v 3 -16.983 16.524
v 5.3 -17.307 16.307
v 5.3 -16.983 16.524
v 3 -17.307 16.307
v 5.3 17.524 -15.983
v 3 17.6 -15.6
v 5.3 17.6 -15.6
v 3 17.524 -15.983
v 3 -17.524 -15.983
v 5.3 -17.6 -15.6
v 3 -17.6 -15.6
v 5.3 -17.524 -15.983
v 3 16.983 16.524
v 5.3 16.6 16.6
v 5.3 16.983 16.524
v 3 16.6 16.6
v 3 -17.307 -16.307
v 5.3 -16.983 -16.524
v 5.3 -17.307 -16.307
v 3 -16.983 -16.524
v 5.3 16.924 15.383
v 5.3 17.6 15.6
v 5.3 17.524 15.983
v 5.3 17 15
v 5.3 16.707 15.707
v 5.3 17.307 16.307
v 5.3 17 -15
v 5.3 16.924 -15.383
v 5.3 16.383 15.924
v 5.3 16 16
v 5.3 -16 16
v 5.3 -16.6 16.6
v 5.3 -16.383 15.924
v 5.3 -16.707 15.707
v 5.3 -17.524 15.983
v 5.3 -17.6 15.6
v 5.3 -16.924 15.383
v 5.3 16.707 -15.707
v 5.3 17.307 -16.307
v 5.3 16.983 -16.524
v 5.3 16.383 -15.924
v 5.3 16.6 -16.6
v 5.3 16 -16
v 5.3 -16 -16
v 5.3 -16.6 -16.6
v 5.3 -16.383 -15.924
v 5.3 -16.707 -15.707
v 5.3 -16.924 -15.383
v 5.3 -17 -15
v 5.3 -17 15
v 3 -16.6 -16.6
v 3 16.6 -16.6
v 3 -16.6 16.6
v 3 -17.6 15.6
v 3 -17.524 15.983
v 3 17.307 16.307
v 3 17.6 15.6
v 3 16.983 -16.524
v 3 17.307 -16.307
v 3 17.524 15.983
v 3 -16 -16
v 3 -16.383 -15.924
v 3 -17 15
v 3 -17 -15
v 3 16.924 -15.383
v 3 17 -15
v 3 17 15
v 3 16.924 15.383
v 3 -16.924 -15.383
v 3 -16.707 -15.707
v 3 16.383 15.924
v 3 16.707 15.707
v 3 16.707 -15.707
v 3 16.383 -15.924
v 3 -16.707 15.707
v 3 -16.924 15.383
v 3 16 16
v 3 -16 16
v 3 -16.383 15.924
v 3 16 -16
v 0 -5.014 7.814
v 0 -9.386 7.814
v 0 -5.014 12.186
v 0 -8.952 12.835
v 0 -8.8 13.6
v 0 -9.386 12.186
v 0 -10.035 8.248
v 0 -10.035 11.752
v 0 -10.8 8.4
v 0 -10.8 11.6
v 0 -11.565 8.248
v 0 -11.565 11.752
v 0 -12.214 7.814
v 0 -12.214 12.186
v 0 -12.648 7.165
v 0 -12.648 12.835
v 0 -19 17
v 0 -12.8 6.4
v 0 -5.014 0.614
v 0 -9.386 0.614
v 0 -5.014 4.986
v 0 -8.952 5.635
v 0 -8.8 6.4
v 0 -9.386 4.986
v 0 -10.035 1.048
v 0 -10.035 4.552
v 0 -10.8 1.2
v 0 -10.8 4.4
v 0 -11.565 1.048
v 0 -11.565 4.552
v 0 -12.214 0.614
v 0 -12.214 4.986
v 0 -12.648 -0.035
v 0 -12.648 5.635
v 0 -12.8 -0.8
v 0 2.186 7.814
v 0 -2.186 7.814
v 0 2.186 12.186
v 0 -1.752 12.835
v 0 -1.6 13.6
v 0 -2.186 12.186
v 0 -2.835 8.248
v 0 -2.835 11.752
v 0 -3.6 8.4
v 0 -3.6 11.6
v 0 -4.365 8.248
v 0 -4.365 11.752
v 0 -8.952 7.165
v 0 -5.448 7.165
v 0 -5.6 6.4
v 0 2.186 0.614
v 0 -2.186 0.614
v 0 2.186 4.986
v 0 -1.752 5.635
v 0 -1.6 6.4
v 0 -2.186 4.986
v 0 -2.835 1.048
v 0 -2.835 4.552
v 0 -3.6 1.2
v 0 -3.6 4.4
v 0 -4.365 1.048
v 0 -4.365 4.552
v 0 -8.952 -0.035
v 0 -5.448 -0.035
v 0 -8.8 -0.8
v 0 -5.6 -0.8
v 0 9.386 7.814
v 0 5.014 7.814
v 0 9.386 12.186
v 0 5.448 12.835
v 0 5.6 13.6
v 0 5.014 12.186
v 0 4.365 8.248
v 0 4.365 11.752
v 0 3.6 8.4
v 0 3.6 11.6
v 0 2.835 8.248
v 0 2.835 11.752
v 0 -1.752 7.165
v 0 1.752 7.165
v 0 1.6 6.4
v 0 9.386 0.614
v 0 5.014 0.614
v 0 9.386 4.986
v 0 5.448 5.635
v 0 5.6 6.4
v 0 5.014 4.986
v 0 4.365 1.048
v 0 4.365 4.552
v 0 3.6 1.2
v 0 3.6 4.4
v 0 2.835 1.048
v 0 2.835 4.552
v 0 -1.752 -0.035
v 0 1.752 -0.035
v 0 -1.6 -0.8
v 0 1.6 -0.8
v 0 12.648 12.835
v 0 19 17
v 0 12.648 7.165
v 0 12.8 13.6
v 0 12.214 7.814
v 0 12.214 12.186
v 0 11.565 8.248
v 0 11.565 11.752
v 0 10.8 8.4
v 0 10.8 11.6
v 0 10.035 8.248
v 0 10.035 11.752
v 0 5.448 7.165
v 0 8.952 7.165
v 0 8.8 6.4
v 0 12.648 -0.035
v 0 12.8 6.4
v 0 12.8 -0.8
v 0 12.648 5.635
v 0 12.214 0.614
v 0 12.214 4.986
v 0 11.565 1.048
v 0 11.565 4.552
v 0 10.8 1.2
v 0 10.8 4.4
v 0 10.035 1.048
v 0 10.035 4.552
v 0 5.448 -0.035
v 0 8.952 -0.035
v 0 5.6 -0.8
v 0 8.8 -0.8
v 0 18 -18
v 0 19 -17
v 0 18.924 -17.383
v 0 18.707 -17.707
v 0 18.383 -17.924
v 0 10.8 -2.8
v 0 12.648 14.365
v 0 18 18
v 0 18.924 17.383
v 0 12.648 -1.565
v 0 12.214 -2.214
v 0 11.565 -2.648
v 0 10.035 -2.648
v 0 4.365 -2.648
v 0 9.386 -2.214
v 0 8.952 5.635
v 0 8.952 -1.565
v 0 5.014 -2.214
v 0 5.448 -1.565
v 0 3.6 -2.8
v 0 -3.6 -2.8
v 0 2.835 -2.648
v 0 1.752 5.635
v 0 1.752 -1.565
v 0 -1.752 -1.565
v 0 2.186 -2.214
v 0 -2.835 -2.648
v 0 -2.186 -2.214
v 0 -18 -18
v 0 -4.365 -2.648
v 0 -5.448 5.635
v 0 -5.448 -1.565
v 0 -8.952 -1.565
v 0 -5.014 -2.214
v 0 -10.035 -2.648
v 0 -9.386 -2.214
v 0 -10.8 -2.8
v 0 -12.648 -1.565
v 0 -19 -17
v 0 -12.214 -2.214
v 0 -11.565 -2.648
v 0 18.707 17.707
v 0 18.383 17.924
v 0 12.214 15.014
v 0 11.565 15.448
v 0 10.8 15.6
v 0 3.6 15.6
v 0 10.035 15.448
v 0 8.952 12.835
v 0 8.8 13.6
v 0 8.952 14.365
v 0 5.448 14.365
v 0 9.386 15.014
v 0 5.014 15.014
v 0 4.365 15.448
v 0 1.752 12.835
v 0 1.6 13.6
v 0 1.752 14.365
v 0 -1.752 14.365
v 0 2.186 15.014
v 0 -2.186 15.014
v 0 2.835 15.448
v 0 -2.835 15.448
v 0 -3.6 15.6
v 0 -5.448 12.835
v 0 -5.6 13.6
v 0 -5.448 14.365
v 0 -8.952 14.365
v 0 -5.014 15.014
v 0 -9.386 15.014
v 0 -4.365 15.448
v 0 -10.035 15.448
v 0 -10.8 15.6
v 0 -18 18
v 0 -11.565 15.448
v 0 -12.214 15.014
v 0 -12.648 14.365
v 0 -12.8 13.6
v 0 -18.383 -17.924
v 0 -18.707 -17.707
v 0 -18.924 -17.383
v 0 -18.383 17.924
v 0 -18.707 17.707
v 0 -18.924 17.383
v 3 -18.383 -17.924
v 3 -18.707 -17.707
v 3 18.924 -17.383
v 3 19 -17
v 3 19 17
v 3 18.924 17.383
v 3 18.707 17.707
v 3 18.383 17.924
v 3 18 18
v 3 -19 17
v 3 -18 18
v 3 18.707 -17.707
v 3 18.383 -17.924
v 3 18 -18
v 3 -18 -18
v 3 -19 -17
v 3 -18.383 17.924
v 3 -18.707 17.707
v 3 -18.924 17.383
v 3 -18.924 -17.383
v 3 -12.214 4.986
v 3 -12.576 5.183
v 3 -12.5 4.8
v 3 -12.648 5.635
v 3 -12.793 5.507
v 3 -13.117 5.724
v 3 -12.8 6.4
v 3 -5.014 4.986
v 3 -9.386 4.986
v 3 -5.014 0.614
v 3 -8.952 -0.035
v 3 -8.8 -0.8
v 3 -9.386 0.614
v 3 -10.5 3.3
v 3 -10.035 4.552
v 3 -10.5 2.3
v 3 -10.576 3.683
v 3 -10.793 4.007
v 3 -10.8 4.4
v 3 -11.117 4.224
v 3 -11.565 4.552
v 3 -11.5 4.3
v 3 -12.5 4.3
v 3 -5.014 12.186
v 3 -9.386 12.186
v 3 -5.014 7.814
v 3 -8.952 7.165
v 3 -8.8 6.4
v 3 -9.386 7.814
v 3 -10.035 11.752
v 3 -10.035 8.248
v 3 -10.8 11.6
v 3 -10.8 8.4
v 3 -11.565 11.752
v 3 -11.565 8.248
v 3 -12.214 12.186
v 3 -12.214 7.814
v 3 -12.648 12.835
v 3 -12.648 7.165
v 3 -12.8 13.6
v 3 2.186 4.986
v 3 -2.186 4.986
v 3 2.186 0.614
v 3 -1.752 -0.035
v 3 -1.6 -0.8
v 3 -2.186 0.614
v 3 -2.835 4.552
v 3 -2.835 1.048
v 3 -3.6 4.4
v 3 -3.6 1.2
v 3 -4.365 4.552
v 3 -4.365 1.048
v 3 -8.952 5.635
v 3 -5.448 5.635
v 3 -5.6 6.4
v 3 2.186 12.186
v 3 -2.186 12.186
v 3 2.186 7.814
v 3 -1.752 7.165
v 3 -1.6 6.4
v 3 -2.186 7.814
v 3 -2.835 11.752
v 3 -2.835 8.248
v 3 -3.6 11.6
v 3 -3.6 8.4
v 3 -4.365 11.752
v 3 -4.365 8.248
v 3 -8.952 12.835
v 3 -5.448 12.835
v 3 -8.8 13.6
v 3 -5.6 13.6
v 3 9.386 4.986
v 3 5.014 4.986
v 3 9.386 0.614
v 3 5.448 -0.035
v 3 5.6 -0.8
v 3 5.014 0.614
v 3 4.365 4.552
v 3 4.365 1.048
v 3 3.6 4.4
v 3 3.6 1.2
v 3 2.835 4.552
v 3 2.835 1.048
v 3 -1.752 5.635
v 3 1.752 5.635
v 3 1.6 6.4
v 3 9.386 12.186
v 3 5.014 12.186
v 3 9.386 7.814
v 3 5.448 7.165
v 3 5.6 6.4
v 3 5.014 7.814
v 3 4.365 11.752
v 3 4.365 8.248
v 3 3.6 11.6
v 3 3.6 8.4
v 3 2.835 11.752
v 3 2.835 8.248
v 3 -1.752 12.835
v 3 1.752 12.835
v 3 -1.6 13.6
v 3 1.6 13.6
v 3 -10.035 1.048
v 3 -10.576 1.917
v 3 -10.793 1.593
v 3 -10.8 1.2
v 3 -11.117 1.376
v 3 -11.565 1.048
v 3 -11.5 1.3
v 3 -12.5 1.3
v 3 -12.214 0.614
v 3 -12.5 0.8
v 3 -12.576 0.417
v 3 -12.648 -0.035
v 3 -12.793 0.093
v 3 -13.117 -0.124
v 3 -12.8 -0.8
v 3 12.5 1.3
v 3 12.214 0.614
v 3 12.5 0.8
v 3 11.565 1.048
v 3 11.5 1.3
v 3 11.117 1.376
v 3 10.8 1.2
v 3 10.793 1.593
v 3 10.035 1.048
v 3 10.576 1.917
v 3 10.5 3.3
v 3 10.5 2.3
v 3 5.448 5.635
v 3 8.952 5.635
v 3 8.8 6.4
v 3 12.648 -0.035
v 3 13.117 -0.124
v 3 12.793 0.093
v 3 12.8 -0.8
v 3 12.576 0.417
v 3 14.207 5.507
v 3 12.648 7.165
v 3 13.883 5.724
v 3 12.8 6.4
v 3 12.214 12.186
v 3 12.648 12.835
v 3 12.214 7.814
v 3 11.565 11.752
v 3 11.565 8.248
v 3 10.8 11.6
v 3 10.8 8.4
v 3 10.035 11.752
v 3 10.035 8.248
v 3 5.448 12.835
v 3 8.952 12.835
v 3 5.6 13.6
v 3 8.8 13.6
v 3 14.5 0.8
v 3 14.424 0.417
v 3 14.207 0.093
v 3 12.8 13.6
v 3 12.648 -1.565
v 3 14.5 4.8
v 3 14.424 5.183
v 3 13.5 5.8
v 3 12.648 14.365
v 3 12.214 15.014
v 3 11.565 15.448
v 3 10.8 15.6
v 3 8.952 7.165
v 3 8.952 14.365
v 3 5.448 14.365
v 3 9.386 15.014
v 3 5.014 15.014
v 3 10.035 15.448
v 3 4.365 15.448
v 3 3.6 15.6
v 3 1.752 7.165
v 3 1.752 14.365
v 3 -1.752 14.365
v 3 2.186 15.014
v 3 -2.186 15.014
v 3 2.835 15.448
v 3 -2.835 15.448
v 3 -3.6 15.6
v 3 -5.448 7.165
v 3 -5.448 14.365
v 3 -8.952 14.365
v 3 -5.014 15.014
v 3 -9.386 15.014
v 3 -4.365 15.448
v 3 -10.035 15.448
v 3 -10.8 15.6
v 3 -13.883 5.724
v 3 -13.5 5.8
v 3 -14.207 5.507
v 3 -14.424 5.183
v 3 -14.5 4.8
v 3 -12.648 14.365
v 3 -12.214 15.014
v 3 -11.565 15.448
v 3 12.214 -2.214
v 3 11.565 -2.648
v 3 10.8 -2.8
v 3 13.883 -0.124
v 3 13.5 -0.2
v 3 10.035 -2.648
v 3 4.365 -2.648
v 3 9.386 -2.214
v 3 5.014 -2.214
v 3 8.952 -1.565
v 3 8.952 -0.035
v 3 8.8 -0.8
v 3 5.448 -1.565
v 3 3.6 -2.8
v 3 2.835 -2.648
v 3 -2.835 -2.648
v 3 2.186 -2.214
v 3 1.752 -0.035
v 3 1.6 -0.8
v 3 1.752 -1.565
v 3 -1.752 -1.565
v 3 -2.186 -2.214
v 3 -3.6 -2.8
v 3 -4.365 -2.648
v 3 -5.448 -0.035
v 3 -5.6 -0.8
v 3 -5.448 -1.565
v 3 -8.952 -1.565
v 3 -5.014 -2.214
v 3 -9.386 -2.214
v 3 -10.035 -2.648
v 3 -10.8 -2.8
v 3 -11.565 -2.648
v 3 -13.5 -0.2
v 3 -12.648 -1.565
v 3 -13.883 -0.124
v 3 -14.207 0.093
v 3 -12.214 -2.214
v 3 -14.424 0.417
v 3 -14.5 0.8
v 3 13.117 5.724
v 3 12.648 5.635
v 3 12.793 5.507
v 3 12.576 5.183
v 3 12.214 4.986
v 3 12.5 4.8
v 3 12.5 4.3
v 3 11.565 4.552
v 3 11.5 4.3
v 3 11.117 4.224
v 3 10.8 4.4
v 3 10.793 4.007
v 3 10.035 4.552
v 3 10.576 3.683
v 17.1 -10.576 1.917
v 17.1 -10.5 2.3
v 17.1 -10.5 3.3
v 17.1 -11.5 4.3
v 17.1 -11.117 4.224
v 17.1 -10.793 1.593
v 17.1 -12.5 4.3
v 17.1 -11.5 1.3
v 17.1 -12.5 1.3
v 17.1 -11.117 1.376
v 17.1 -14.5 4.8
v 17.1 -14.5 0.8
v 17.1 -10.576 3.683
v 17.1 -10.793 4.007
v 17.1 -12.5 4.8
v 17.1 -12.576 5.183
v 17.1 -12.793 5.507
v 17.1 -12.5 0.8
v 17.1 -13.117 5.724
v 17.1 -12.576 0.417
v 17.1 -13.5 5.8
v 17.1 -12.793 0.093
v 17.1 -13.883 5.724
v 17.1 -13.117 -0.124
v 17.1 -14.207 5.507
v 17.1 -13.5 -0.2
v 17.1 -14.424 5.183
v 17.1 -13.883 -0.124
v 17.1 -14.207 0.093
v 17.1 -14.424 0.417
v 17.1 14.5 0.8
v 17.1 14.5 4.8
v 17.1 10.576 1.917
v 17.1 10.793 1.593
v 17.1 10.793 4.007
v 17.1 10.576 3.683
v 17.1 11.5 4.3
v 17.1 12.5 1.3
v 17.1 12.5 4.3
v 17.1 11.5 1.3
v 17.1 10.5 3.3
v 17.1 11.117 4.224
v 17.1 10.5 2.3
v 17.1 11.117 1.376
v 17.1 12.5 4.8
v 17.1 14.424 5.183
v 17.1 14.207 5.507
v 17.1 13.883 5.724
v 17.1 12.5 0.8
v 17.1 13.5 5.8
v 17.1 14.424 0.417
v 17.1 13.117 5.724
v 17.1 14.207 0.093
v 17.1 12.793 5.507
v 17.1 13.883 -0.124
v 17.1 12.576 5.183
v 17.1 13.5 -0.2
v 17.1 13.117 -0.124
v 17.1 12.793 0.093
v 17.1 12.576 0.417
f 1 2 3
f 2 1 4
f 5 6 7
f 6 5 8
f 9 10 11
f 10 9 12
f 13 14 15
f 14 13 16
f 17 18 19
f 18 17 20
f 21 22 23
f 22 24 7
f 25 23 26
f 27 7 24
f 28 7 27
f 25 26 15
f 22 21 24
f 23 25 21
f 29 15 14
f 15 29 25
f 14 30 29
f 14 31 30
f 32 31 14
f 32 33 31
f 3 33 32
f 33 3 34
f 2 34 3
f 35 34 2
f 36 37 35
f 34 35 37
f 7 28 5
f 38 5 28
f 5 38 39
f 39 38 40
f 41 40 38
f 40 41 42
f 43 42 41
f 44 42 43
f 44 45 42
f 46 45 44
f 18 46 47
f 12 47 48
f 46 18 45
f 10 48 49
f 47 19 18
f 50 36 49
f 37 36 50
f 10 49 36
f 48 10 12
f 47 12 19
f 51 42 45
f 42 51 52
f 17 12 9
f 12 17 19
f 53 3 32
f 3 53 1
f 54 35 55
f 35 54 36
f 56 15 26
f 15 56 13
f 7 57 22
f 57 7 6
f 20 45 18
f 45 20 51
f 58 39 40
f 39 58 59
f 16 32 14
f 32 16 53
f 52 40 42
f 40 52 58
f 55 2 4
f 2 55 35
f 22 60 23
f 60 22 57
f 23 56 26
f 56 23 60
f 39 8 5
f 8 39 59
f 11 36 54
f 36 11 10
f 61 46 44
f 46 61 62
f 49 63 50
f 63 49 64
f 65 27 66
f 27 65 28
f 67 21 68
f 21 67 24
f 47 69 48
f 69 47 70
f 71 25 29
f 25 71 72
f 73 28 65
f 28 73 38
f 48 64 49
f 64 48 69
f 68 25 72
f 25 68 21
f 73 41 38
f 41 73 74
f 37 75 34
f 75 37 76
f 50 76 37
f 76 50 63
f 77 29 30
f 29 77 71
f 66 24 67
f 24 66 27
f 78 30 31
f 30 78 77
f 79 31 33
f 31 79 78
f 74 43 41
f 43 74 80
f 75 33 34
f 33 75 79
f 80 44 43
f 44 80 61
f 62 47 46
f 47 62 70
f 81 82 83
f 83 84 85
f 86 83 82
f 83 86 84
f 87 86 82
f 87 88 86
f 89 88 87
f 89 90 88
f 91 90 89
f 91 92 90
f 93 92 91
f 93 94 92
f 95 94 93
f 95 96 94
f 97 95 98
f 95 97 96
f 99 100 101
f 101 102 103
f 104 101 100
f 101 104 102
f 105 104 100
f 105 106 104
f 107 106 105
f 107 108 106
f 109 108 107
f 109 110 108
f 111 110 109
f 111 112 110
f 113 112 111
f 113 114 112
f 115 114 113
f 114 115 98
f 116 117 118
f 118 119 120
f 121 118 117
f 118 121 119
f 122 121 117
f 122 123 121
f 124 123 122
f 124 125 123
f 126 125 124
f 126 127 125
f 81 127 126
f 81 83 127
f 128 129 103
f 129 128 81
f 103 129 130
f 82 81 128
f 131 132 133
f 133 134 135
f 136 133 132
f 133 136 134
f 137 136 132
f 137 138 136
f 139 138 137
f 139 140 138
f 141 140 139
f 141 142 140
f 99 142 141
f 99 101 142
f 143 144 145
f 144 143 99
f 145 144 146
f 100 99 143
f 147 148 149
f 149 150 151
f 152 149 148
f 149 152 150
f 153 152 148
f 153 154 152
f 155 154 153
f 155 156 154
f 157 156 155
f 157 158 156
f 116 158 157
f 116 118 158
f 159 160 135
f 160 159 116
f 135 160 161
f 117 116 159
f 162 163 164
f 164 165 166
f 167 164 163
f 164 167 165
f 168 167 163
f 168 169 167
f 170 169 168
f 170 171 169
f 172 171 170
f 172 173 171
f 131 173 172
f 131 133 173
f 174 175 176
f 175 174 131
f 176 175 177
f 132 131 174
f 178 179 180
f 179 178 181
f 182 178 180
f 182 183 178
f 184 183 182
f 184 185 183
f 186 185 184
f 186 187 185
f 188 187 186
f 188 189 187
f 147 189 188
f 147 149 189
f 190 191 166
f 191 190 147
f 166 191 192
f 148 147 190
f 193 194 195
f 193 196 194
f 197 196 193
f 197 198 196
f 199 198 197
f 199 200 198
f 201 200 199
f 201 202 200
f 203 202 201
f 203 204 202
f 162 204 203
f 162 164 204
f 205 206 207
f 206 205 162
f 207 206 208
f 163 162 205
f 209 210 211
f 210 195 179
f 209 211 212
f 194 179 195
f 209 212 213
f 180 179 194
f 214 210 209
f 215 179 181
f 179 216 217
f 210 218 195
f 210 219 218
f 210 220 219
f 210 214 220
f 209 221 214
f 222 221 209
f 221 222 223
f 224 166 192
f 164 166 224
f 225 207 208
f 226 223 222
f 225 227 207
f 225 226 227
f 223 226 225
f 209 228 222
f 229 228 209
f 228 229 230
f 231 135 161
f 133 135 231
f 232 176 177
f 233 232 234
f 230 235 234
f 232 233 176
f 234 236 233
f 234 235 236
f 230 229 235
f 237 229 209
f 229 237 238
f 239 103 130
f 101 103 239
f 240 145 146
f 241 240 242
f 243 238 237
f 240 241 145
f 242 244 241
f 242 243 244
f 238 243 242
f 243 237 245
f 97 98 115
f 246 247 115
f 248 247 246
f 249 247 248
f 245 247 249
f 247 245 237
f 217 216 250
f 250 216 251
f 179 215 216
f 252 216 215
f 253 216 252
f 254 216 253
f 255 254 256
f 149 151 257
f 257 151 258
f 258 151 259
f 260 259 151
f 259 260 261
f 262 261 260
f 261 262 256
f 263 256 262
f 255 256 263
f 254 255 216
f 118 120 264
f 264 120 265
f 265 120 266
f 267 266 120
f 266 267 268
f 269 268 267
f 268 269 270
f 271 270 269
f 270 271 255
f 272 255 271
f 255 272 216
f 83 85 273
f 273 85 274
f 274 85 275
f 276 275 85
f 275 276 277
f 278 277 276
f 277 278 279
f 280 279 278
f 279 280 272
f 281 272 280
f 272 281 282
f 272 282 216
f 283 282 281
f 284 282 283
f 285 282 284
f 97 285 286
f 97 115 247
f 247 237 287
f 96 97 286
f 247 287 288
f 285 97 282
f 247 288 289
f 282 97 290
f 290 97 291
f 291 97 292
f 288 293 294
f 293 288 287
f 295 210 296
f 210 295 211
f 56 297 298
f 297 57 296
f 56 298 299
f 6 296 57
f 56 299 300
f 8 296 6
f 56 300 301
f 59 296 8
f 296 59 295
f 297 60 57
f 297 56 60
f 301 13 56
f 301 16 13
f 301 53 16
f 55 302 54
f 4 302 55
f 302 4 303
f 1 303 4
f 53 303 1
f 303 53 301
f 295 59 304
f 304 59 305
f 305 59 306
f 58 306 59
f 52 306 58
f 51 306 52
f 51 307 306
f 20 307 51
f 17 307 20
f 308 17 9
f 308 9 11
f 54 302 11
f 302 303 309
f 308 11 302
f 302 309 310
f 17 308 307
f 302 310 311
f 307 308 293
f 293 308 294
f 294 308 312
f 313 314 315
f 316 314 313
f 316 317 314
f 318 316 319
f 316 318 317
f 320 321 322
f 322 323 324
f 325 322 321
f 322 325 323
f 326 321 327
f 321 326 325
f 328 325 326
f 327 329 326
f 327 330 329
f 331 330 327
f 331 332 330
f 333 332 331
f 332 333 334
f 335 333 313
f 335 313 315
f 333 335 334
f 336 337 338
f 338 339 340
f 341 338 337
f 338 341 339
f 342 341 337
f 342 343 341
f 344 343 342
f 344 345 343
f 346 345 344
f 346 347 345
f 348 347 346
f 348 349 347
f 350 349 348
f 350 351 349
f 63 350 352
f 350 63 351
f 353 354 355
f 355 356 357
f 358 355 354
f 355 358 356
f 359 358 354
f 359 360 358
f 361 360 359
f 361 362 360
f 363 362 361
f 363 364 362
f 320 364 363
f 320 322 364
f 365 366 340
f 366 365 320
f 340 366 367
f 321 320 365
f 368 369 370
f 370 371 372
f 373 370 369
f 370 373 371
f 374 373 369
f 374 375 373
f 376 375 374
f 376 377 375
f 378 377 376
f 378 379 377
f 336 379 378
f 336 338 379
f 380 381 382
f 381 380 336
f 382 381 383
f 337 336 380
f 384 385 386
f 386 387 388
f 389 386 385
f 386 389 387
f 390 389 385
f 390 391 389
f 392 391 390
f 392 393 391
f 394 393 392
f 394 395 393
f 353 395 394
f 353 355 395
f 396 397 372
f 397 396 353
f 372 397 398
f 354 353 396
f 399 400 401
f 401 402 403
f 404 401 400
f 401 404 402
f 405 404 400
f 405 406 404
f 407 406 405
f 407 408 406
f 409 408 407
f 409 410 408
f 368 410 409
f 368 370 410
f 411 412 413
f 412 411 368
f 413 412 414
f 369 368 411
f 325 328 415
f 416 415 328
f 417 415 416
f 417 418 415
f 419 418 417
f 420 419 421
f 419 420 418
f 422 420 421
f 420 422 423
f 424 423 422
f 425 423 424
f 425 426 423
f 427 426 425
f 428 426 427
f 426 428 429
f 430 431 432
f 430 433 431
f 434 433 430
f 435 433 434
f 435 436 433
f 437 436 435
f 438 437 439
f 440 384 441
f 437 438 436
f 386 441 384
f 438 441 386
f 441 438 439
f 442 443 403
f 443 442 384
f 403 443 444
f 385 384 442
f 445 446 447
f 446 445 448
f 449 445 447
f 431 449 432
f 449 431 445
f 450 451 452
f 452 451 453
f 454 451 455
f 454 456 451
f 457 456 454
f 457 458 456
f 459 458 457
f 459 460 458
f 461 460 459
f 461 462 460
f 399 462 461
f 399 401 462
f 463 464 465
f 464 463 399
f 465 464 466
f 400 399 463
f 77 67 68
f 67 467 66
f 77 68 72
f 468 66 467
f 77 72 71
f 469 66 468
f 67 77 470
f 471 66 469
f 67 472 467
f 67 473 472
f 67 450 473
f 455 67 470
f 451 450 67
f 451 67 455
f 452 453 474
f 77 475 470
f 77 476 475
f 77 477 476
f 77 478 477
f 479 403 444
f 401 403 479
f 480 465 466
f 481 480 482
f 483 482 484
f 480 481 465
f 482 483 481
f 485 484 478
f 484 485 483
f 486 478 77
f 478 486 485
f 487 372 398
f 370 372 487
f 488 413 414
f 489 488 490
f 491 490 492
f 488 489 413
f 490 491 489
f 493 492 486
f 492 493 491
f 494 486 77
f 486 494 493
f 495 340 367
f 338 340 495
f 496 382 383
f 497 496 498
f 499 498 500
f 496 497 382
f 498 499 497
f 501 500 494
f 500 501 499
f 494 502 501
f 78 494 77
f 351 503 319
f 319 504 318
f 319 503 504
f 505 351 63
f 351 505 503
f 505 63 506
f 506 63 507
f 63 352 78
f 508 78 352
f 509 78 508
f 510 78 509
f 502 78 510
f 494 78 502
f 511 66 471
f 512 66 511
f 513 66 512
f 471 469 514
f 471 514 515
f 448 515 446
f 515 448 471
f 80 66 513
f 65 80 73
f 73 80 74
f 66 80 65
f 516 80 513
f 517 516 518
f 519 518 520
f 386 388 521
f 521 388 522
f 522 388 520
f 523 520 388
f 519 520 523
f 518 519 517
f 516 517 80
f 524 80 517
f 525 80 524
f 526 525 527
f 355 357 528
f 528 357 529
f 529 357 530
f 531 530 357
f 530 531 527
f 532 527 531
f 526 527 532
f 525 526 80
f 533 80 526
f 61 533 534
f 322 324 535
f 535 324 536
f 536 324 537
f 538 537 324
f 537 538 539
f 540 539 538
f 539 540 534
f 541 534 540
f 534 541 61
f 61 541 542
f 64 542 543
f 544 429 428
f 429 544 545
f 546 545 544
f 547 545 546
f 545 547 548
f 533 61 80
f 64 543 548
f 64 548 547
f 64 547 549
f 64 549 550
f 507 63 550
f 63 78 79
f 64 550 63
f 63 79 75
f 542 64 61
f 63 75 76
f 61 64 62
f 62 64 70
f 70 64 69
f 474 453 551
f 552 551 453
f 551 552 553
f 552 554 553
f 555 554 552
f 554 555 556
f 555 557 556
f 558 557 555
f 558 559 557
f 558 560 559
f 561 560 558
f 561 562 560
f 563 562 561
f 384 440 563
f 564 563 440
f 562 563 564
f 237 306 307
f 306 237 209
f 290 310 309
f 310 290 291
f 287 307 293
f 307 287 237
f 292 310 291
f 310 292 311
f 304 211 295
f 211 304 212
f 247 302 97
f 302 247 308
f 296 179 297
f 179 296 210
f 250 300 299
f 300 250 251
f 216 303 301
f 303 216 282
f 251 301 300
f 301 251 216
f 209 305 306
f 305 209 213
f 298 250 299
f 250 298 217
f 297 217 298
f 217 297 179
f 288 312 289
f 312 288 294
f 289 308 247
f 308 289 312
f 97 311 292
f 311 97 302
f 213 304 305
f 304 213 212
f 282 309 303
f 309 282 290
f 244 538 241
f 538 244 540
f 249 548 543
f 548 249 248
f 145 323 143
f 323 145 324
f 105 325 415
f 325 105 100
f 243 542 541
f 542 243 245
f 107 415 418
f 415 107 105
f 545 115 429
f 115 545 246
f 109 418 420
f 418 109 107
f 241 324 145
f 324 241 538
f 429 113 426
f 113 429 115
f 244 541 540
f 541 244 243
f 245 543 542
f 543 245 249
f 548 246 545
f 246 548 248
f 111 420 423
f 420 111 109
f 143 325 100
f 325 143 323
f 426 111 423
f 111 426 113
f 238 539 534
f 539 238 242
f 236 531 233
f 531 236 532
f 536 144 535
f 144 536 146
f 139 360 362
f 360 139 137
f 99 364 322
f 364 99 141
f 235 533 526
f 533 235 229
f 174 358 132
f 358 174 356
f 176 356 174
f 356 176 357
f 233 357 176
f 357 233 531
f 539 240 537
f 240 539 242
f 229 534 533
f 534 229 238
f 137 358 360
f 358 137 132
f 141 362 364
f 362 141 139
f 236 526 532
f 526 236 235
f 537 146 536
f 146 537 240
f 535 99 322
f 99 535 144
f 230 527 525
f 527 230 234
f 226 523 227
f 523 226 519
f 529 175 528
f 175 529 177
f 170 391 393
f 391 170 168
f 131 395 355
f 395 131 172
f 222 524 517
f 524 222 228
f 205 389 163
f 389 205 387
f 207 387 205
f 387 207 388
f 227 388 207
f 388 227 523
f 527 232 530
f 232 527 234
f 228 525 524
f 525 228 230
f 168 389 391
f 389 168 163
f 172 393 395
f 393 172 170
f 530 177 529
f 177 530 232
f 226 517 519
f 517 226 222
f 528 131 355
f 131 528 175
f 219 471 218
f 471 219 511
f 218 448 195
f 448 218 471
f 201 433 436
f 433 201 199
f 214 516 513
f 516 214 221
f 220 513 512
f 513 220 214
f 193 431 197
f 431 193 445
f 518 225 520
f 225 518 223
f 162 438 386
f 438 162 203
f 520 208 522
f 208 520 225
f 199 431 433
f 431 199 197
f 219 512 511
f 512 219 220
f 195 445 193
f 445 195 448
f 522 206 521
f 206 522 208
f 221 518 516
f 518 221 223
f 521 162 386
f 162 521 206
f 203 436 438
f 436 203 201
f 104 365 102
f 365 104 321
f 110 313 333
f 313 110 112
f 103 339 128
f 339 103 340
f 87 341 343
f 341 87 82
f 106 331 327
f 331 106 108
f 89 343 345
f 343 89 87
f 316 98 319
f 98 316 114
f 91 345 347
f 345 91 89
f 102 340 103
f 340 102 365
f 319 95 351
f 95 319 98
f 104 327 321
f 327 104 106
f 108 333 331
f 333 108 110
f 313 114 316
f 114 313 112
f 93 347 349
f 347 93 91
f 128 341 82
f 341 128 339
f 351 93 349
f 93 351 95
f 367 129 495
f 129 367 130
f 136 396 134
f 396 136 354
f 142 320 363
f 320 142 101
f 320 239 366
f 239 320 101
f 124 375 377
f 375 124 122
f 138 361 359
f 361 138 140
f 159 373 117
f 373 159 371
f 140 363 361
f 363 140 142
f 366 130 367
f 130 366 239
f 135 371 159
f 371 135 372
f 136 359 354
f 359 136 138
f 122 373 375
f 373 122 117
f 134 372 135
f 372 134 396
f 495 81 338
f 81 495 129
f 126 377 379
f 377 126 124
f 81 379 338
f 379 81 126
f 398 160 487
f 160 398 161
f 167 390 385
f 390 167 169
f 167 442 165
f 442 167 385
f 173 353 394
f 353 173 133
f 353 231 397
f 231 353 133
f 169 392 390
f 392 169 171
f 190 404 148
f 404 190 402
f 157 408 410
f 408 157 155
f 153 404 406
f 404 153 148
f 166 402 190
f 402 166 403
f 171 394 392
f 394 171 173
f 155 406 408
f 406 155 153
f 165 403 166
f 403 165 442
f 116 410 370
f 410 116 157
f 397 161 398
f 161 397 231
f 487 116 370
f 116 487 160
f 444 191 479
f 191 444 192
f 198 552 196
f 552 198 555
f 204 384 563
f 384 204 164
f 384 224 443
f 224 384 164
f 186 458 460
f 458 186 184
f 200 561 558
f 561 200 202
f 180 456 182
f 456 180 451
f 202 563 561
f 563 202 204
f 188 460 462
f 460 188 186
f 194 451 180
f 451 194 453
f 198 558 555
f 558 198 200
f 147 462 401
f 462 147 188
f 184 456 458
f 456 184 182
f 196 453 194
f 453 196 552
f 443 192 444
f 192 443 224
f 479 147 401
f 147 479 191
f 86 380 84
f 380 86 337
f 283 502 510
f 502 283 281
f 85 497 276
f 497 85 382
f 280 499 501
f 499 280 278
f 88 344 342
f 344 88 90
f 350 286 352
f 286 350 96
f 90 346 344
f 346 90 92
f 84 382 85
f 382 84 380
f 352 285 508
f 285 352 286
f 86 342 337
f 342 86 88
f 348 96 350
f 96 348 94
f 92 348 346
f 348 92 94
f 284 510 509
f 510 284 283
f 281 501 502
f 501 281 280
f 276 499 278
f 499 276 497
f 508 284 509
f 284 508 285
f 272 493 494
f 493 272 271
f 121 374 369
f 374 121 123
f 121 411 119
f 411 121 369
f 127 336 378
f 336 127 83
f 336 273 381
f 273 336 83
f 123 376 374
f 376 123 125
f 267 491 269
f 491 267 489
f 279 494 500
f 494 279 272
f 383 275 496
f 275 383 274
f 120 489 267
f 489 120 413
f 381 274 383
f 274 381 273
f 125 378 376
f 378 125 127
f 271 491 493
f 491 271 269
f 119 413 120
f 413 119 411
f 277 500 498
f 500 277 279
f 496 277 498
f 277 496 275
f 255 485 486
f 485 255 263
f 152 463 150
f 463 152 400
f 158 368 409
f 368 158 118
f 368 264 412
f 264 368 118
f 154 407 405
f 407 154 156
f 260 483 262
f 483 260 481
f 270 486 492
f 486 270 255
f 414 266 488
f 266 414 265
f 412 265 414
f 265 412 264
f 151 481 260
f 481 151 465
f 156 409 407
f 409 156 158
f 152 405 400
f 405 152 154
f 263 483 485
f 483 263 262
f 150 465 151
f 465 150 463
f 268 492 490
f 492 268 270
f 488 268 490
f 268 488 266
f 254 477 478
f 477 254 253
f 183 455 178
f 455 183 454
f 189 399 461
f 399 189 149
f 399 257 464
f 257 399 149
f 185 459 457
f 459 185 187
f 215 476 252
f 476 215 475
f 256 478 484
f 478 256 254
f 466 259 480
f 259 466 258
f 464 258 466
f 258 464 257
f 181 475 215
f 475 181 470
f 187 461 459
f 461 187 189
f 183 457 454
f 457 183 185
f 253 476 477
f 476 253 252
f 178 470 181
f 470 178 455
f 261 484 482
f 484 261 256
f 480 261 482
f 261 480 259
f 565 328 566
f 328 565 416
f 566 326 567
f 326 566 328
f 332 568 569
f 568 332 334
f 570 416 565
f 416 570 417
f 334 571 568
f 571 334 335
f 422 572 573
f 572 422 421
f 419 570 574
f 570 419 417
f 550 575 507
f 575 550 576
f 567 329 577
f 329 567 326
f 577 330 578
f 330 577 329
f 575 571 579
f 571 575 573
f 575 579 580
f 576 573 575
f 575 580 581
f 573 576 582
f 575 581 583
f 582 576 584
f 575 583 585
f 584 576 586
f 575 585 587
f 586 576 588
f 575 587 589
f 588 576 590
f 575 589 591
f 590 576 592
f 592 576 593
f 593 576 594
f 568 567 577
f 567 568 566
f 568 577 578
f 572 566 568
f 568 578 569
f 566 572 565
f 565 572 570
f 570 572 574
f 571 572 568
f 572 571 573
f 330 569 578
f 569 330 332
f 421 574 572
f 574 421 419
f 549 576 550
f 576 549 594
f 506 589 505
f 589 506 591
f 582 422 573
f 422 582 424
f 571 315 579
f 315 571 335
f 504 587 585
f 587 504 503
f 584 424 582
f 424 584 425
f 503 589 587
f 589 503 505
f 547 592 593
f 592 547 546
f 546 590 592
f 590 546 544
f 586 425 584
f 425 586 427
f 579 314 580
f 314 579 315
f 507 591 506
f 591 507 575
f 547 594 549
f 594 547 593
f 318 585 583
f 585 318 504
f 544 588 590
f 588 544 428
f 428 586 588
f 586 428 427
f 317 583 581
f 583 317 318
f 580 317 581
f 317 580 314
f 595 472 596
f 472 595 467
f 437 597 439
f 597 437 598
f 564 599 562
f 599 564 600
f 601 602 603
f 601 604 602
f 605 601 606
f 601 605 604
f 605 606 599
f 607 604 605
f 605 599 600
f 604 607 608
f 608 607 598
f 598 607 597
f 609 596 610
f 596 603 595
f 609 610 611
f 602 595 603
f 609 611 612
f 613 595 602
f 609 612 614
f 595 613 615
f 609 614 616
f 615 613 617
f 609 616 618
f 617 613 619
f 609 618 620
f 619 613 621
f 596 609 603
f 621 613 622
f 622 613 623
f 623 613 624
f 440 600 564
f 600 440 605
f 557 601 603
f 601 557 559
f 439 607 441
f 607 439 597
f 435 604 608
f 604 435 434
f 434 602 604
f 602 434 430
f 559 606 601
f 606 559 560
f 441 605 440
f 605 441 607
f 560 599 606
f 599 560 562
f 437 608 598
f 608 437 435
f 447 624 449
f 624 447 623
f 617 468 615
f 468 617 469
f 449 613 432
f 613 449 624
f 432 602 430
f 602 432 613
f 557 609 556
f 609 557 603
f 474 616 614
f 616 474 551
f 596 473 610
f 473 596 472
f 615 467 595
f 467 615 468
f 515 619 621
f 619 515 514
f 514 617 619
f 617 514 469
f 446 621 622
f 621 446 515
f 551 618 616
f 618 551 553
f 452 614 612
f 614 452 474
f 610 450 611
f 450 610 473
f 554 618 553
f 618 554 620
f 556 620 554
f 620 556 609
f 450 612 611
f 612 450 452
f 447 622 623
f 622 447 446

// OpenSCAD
//
// PAM8403-based tiny amplifier board enclosure
//
// This work is licensed under a Creative Commons Attribution 4.0 International License.
// https://creativecommons.org/licenses/by/4.0/
//

use <prim.scad>

// printer error related tweaks
//
// Recommended values:
//   - For Wood PLA, LID_ERROR=0.8, HOLD_ERROR=0.0.
//   - For PLA,      LID_ERROR=0.0, HOLD_ERROR=0.4.
LID_ERROR  = 0.8; // if the lid does not fit, make this larger. 0.1-0.4 too small
HOLD_ERROR = 0.0; // if the board holder is too loose, make this larger. 0.4 or 0.6

// inner size of the box
size_x = 24;
size_y = 31-HOLD_ERROR;
size_z = 17;
shell_thick = 1;
shell_extend = 2; // extension length for lid

arm_cut_y = 8;
arm_thick = 1;
arm_board_thick = 2;
arm_lo_z  = 2;
arm_up_z  = 2;
arm_up_z0 = arm_lo_z + arm_board_thick + arm_up_z/2;
arm_z     = arm_lo_z + arm_board_thick + arm_up_z;

// volume knob hole (front)
front_hole_dz = 10.5; // distance from left-bottom corner (looking from frontside)
front_hole_dy = 5.5;   // distance from left-bottom corner (looking from frontside)
front_hole_r  = 3.5;  // radius

// lid
lid_inner_x = 2;
lid_inner_thick = 1;

// other shape configurations
mink_error = 0.2; // 0.2 for normal PLA, 0.4 for wood PLA
lidinner = 2.0; // thickness of lid inner part

// further customization example: make a hole on the front surface
// coordinates are from left-bottom edge of inner space
// ***volume knob hole***
//front_hole_y=3.0;
//front_hole_z=8.0;

// a hole on the lid side
// ***cable holes***
lid_hole_y=2.3;
lid_hole_z=6;
lid_hole_r=0.9;
lid_vent_r=0.7;

// other shape parameters
thick = 0.4;  // wall thickness
mink =  0.4;  // minkowski radius
spfn =  16;   // minkowski resolution

// internal configurations
difoff   = thick+mink*3;  // offset to apply difference correctly for the inner space
lidoff   = -6; // x-offset to locate the lid
size_x_room = size_x + lidinner + mink; // size_x that lidinner takes into account. (this may or may not be necessary depending on shape of stuffing.)
WELDING= 0.4;

// render target; this is meant to be overriden by Makefile
//TARGET="default";
TARGET="unit_lid_test";

//
// top level logic
//
pam8403_main();

module pam8403_main(target=TARGET){
    
    if (target == "default") {
//        pam8403_unit(ox=40, oy=38, oz=36, with_vent=1, with_cabling=1, with_lid=1, with_shell=1, with_holder=1);
        pam8403(with_vent=1);
    }

    if (target == "novent") {
        pam8403(with_vent=0);
    }

    if (target == "body_only") {
        pam8403(with_body=1, with_lid=0);
    }

    if (target == "lid_only") {
        pam8403(with_body=0, with_lid=1);
    }

    if (target == "unit_test") {
        translate([40,0,0]){
            pam8403_unit(ox=40, oy=38, oz=36, with_vent=0, with_cabling=1, with_lid=0, with_shell=1, with_holder=1, with_side=1);
        }
        pam8403_unit_lid_only(ox=40, oy=38, oz=36, with_vent=0, with_cabling=1, with_lid=0, with_shell=0, with_holder=0, with_hole=0, with_vent_lid=1);
    }
    
    if (target == "unit_lid_test") {
        pam8403_unit_lid_only(ox=40, oy=38, oz=36, lid_thick=3, with_vent=0, with_cabling=1, with_lid=0, with_shell=0, with_holder=0, with_hole=0, with_vent_lid=1, with_arm=1);
    }
    
}


// -------------------------
// Public Modules
// -------------------------

// [Public]
// Minimum size enclosure.
//
// with_vent = { 1: with ventilation slits, 0: without ventilation slits }
// with_vent_lid = { 1: with ventilation slits on the lid, 0: without ventilation slits on the lid }
// with_lid  = { 1: render the lid, 0: does not render the lid }
// with_body = { 1: render the body, 0: does not render the body }
// with_print = { 1: print layout (models are rotated to be printable), 0: edit layout (no rotation) }
module pam8403(with_vent=1, with_vent_lid=0, with_lid=1, with_body=1, with_print=1){

    ox = size_x + shell_thick*2;
    oy = size_y + shell_thick*2;
    oz = size_z + shell_thick*2;

    if (with_body) {
        translate([size_x+shell_thick,0,size_x/2]) {
            rotate([0,90,0]) {
                pam8403_unit_body_only(ox=ox, oy=oy, oz=oz, with_vent=with_vent, with_cabling=0, with_lid=1, with_shell=0, with_holder=1, with_side=0, with_print=with_print);
            }
        }
    }

    if (with_lid) {
        rotate([0,-90,0]) {
            pam8403_unit_lid_only(ox=ox, oy=oy, oz=oz, lid_thick=shell_thick, with_vent=with_vent, with_cabling=0, with_lid=1, with_shell=0, with_holder=1, with_side=0, with_vent_lid=with_vent_lid, with_print=with_print);
        }
    }
}

// [Public]
// Variable size enclosure. Typically to be embededd in another project.
// 
// ox, oy, oz = dimension (this has to be equals to or larger than (size_x, size_y, size_z).
// with_body = { 1: render the body, 0: does not render the body }
// with_lid  = { 1: render the lid, 0: does not render the lid }
// with_vent = { 1: with ventilation slits, 0: without ventilation slits }
// with_vent_lid = { 1: with ventilation slits on the lid, 0: without ventilation slits on the lid }
// with_cabling = { 1: render a big openings on the enclosure for easier cabling, 0: without such openings }
// with_shell = { 1: render the shell (outermost enclosure that matches the requested dimension). 0: does not render the shell.}
// with_holder = { 1: render the holder to support PAM8403 board. 0: without holder (testing purpose). }
// with_side   = { 1: fill in the side space between the shell and the holder (to avoid oozing). 0: does not do that. }
// with_print = { 1: print layout (models are rotated to be printable), 0: edit layout (no rotation) }
module pam8403_unit(ox, oy, oz, lid_thick=shell_thick, with_vent, with_cabling, with_lid, with_shell, with_holder, with_side=0, with_vent_lid=0, with_print=1, with_open_roof=0){
    if (with_print){
        rotate([0,90,0]) {
            //translate([-ox/2,oy/2-10,oz/2]) {
            translate([0,0,0]) {
                pam8403_unit_body_only(ox=ox, oy=oy, oz=oz, with_vent=with_vent, with_cabling=with_cabling, with_lid=with_lid, with_shell=with_shell, with_holder=with_holder, with_side=with_side, with_open_roof=with_open_roof);
            }
        }
    } else {
        pam8403_unit_body_only(ox=ox, oy=oy, oz=oz, with_vent=with_vent, with_cabling=with_cabling, with_lid=with_lid, with_shell=with_shell, with_holder=with_holder, with_side=with_side, with_open_roof=with_open_roof);
    }

    if (with_lid) {
        translate([-ox/2,0,0]) {
            pam8403_unit_lid_only(ox=ox, oy=oy, oz=oz, lid_thick=lid_thick, with_vent=with_vent, with_cabling=with_cabling, with_lid=with_lid, with_shell=with_shell, with_holder=with_holder, with_vent_lid=with_vent_lid);
        }
    }
}

// [Public]
// Variable size enclosure(body only). Typically to be embededd in another project.
// 
// ox, oy, oz = dimension (this has to be equals to or larger than (size_x, size_y, size_z).
// with_body = { 1: render the body, 0: does not render the body }
// with_lid  = { 1: render the lid, 0: does not render the lid }
// with_vent = { 1: with ventilation slits, 0: without ventilation slits }
// with_vent_lid = { 1: with ventilation slits on the lid, 0: without ventilation slits on the lid }
// with_cabling = { 1: render a big openings on the enclosure for easier cabling, 0: without such openings }
// with_shell = { 1: render the shell (outermost enclosure that matches the requested dimension). 0: does not render the shell.}
// with_holder = { 1: render the holder to support PAM8403 board. 0: without holder (testing purpose). }
// with_side   = { 1: fill in the side space between the shell and the holder (to avoid oozing). 0: does not do that. }
// with_print = { 1: print layout (models are rotated to be printable), 0: edit layout (no rotation) }
module pam8403_unit_body_only(ox, oy, oz, with_vent, with_cabling, with_lid, with_shell, with_holder, with_side=0, with_open_roof=0){
    // put holder at the left-top corner (looking from back side) = right-top corner (looking from front side)
    hx = ox/2 - size_x/2 - shell_thick;
    hy = 0;
    hz = oz/2 - size_z/2 - shell_thick;
    dz = shell_thick*with_shell;
    
    translate([0,0,0]) {
        if (with_shell) {
            difference(){
                union() {
                    pam8403_shell(ox, oy, oz, shell_thick, with_vent, with_cabling);
                }
                // put the negative volume at exactly same position as holder
                translate([-shell_thick, hy, hz-dz+shell_thick]) {
                    rotate([0,0,0]) {
                        #pam8403_holder_negative_volume(ox, size_y, size_z, shell_extend, shell_thick, with_vent, with_cabling);
                    }
                }
            }
        }
        if (with_holder) {
            translate([hx, hy, hz-dz]) {
                rotate([0,0,0]) {
                    pam8403_holder(size_x, size_y, size_z, ox, oy, oz, shell_extend, shell_thick, with_vent=with_vent, with_cabling=with_cabling, with_side=with_side, with_open_roof=with_open_roof);
                }
            }            
        }
    }
}

// [Public]
// Variable size enclosure(lid only). Typically to be embededd in another project.
// 
// ox, oy, oz = dimension (this has to be equals to or larger than (size_x, size_y, size_z).
// with_body = { 1: render the body, 0: does not render the body }
// with_lid  = { 1: render the lid, 0: does not render the lid }
// with_vent = { 1: with ventilation slits, 0: without ventilation slits }
// with_vent_lid = { 1: with ventilation slits on the lid, 0: without ventilation slits on the lid }
// with_cabling = { 1: render a big openings on the enclosure for easier cabling, 0: without such openings }
// with_shell = { 1: render the shell (outermost enclosure that matches the requested dimension). 0: does not render the shell.}
// with_holder = { 1: render the holder to support PAM8403 board. 0: without holder (testing purpose). }
// with_side   = { 1: fill in the side space between the shell and the holder (to avoid oozing). 0: does not do that. }
// with_print = { 1: print layout (models are rotated to be printable), 0: edit layout (no rotation) }
module pam8403_unit_lid_only(ox, oy, oz, lid_thick=shell_thick, with_vent, with_cabling, with_lid, with_shell, with_holder, with_hole=1, with_vent_lid=0, with_arm=0){
    // put holder at the left-top corner (looking from back side) = right-top corner (looking from front side)
    hx = ox/2 - size_x/2 - shell_thick;
    hy = 0;
    hz = oz/2 - size_z/2 - shell_thick;
    sx = size_x;
    sy = size_y;
    sz = size_z;
    st = shell_thick;

    translate([lid_thick/2,0,0]) {
        difference() {
            union() {
                // lid outer
                prim_round_xplate(lid_thick, oy, oz, 1, 16);

                // lid inner
                translate([lid_thick-WELDING,0,0]) {
                    difference(){
                        prim_round_xplate(lid_inner_x+WELDING, oy-shell_thick*2-LID_ERROR, oz-shell_thick*2-LID_ERROR, 1, 16);
                        prim_round_xplate(lid_inner_x+WELDING, oy-shell_thick*4, oz-shell_thick*4, 1, 16);
                    }
                }
            }

            union() {
                // cable holes
                if (with_hole) {
                    y3 = 6; // 3-cable width (22 AWG)
                    y2 = 4; // 2-cable width (22 AWG)
                    z1 = 3; // 1-cable height (22 AWG)

                    // audio input (3-cable)
                    translate([0, -sy/2+shell_thick*2+2+y3/2, -sz/2+shell_thick+arm_lo_z+arm_board_thick+arm_up_z]) {
                        #prim_round_xplate(st*6, y3, 3, 1, 16);
                    }
                    // power input (2-cable)
                    translate([0, y2/2, -sz/2+shell_thick+arm_lo_z+arm_board_thick+arm_up_z]) {
                        #prim_round_xplate(st*6, y2, 3, 1, 16);
                    }

                    // audio output left (2-cable)
                    translate([0, 3+y2/2, sz/2-shell_thick*2-3]) {
                        #prim_round_xplate(st*6, y2, 3, 1, 16);
                    }

                    // audio output right (2-cable)
                    translate([0, -3-y2/2, sz/2-shell_thick*2-3]) {
                        #prim_round_xplate(st*6, y2, 3, 1, 16);
                    }
                }

                // lid vent holes (4x3)
                if (with_vent_lid) {
                    for (iz=[  -0.3, 0.9, 2.1]) {
                        for (iy=[-1.8, -0.6, 0.6, 1.8]) {
                        translate([0, 6*iy, 6*iz+1]) {
                            rotate([0, 90, 0]) {
                                cylinder(h=lid_thick*2, r=2, $fn=16, center=true);
                            }
                            }
                        }
                    }
                }
            }
        }

        if (with_arm) {
            // lid inner arm (to hold the board)
            ah = ox - size_x - shell_thick*2 + lid_inner_x;
            az = oz/2-shell_thick-sz+arm_lo_z + arm_board_thick/2;
            ay = 4;
            az = 3;
            echo (ah=ah, az=az);
            translate([0, 0, 0.3*6+1]) {
                for (iy = [-1,1]) {
                    translate([0, (sy/2-shell_thick)*iy, 0]) {
                        translate([ah/2-WELDING, (-ay/2)*iy, 0]) {
                            prim_round_xplate(ah, ay, 3, 1, 16);
                        }

                        hull(){
                        for (iz = [-1,1]) {
                            translate([ah/2-WELDING, (-2/2)*iy, 2*iz]) {
                                rotate([0, 90, 0]) {
                                    cylinder(h=ah, r=1, $fn=16, center=true);
                                }
                            }
                        }
                        }
                    }
                }
            }
        }
    }
}

// -------------------------
// Private Modules
// -------------------------

module pam8403_shell(ox, oy, oz, st, with_vent, with_cabling) {
    // outer shell
    difference(){
        difference(){
            prim_round_xplate(ox, oy, oz, 1, 16);
            translate([-shell_thick,0,0])
                prim_round_xplate(ox, oy-shell_thick*2, oz-shell_thick*2, 1, 16);
        }
        pam8403_shell_negative_volume(ox, oy, oz, shell_thick, with_vent, with_cabling);
    }

}

module pam8403_shell_negative_volume(sx, sy, sz, st, with_vent, with_cabling) {
    with_cabling_type0 = 0;
    // vent top
    if (with_cabling) {
        translate([0,0,sz/2]) {
            for (iy=[-2,-1,0,1,2]) {
                translate([0,iy*5.9,0]) {
                    if (with_cabling_type0) { 
                        prim_round_zplate0(sx*0.6, 3, st*3, 1, 16);
                    } else {
                        for (ix=[-2,-1,0,1,2]) {
                            translate([ix*5.9, 0, 0]) {
                                cylinder(h=st*4, r=1.6, $fn=16, center=true);
                            }
                        }
                    }
                }
            }
        }
    }

    // vent side
    if (!with_cabling) {
        if (with_vent) {
            translate([0,0,0]) {
                for (i=[-2,-1,0,1,2,3]) {
                    translate([0,0,i*5-2]) {
                        prim_round_yplate0(sx*0.6, sy*2, 2, 1, 16);
                    }
                }
            }
        }
    }
}


// holder extension to support lid
module pam8403_lid_holder_extension(sx, sy, sz, sh, st, with_vent, with_cabling) {
    // inner holder
    translate([-sx/2-st,0,0]) {
        difference(){
            prim_round_xplate(sh*2, sy+st*2, sz+st*2, 1, 16);
            #prim_round_xplate(sh*2.5, sy, sz, 1, 16);
        }
    }
}

// holder to support PAM8403 board
module pam8403_holder(sx, sy, sz, ox, oy, oz, sh, st, with_vent, with_cabling, with_side=0, with_open_roof=0) {
    dy = (oy-sy-st*2)*with_side;
    // inner holder
    translate([st/2,0,st])
        union(){
        difference(){
            union(){
                difference(){
                    prim_round_xplate(sx+st, sy+st*2+dy, sz+st*2, 1, 16);
                    translate([-st,0,0])
                        prim_round_xplate(sx+st, sy, sz, 1, 16);
                }
                if (sh > 0) { // extend shell in x-axis to support lid
                    pam8403_lid_holder_extension(sx, sy, sz, sh, st, with_vent, with_cabling);
                }
                translate([WELDING,0,0]) {
                    pam8403_hold_arm(sx, sy, sz, with_vent);
                }
            }
            union() {
                pam8403_holder_negative_volume(sx, sy, sz, sh, st, with_vent=with_vent, with_cabling=with_cabling); // shared with shell
                pam8403_holder_negative_volume_private(sx, sy, sz, sh, st, with_vent=with_vent, with_cabling=with_cabling, with_open_roof=with_open_roof); // private to holder
            }
        }
    }
}

// negative volume that could be shared with outer shell (like the front knob hole)
module pam8403_holder_negative_volume(sx, sy, sz, sh, st, with_vent, with_cabling) {
    // front knob hole
    translate([sx/2, -sy/2+front_hole_dy, -sz/2+front_hole_dz]) {
        rotate([0,90,0]) {
            #cylinder(r = front_hole_r*1.1, $fn = 64, h=st*4, center=true);
        }
    }
}

// negative volume that does not need to be shared with outer shell (like vent slits)
module pam8403_holder_negative_volume_private(sx, sy, sz, sh, st, with_vent, with_cabling, with_open_roof=0) {
    // open roof
    if (with_open_roof) {
        translate([-sx/2, 0, sz/2+st]) {
            #prim_round_zplate0(sx*2, sy, st*2+WELDING, 2, 16);
        }
    }

    // open top/bottom for compo scenario
    if (with_cabling) {
        // bottom
        translate([-sx/2-shell_thick-sh, 0, -sz/2-st]) {
            #prim_round_zplate0(sx*0.8, sy*0.9, st*2+WELDING, 2, 16);
        }
        // top
        translate([-sx/2-shell_thick-sh, 0, sz/2+st]) {
            #prim_round_zplate0(sx*1.9, sy*0.9, st*2+WELDING, 2, 16);
        }
    }

    if (with_vent) {
        // side vent
        for (i=[0.5,2]) {
            translate([-st*1.5,0,i*3.5-2]) {
                #prim_round_yplate0(sx*0.8, sy+st*2+WELDING, 3, 1.4, 16);
            }
        }

        // top/bottom vent
        for (i=[-2,-1,0,1,2]) {
            translate([-st*1.5,i*5.5,0]) {
                #prim_round_zplate0(sx*0.8, 3, sz+st*2+WELDING, 1.4, 16);
            }
        }
    }
    
    // vent
}


module pam8403_hold_arm(ox, oy, oz, with_vent){
    // for debug
    //translate([-size_x*1.6,0,0])
    {
        // 
        translate([-arm_thick, 0, -size_z/2+arm_z/2]) {
            difference(){
                // outer shell is slightly larger for WELDING (considering compo scenario)
                translate([0,0,-WELDING]) {
                    cube([size_x+WELDING*2, size_y+WELDING*2, arm_z+WELDING*2], center=true);
                }
                union(){
                    // wide open it
                    translate([-arm_thick*2-2,0,-WELDING]) {
                        #prim_round_zplate0(size_x+arm_thick*2, size_y-arm_thick*2, arm_z+WELDING*2, 2, 16);
                    }

                    // make board slot in the middle (in z-axis)
                    translate([-WELDING-2, 0, 0]) {
                        // board slot
                        cube([size_x+WELDING+WELDING*2, size_y+WELDING*1, arm_board_thick], center=true);
                        // (for debug)
                        //cube([size_x*2, size_y*2, 1], center=true);
                    }

                    // misc cuts
                    translate([size_x/2-arm_thick-shell_thick-arm_thick, -size_y/2+arm_thick/2, arm_board_thick]) {
                        #cube([size_x*2,arm_up_z*2+WELDING,arm_up_z+0.01], center=true);
                    }
                    translate([size_x/2-arm_thick-shell_thick-arm_thick, -size_y/2+arm_thick/2+arm_cut_y/2, arm_board_thick]) {
                        #cube([size_x*2,arm_cut_y+shell_thick*2, arm_up_z], center=true);
                    }
                    
                    translate([-size_x/2-arm_thick, 0, 0]) {
                        #cube([arm_thick*2, size_y*2, 8], center=true);
                    }
                }
            }
        }
    }
}
